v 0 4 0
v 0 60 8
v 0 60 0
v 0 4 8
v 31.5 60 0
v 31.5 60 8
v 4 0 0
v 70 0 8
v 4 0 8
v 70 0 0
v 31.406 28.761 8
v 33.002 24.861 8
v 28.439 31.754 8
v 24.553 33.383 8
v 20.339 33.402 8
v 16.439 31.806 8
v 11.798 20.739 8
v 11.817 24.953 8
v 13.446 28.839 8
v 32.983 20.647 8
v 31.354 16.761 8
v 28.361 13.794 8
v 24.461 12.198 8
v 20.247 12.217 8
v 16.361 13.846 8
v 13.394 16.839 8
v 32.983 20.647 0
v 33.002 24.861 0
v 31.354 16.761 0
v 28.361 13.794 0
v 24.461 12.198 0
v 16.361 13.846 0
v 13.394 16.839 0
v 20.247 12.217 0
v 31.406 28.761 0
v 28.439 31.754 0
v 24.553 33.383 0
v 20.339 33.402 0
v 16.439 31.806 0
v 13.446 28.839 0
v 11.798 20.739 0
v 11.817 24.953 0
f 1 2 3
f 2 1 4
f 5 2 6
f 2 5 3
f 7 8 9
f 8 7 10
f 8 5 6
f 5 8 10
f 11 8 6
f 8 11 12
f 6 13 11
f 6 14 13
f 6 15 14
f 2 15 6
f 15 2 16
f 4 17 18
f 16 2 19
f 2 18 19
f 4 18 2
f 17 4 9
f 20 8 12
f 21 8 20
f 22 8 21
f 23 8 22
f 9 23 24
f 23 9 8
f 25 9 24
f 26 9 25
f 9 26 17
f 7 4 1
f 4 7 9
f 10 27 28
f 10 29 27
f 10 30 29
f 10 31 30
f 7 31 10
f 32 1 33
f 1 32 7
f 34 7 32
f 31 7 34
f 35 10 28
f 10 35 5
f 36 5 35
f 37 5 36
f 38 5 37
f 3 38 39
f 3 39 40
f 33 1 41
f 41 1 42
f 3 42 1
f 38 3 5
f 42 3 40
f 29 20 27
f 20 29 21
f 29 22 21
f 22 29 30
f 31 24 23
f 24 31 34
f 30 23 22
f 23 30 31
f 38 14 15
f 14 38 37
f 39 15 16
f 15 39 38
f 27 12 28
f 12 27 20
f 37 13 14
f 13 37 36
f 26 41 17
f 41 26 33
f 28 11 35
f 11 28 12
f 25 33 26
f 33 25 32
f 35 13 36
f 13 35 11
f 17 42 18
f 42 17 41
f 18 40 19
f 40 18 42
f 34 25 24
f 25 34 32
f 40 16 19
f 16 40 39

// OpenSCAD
$fn = 32;

// ----------------------------------------------------------------------
// Bracket plate: gusset 70 x 60
// ----------------------------------------------------------------------

// --- parameters (mm) ---
hole_r = 3.5;             // bolt hole radius
plate_t = 8;              // plate thickness, Z (extrusion height)
gus_a = 70;               // base length
gus_b = 60;               // height
top_x = 31.5;             // top edge X of the angled cut
light_r = 10.8;           // lightening hole radius
fit_tol = 0.05;           // declared fit tolerance (prompt contract)
free_tol = 0.3;           // declared free tolerance (prompt contract)

light_d = 2 * light_r;

profile = [[4, 0], [35, 0], [70, 0], [31.5, 60], [0, 60], [0, 4]];  // primary outline, 6 points, counter clockwise
void_1 = [[33.002, 24.861], [31.406, 28.761], [28.439, 31.754], [24.553, 33.383], [20.339, 33.402], [16.439, 31.806], [13.446, 28.839], [11.817, 24.953], [11.798, 20.739], [13.394, 16.839], [16.361, 13.846], [20.247, 12.217], [24.461, 12.198], [28.361, 13.794], [31.354, 16.761], [32.983, 20.647]];  // lightening hole, 16 points

// --- the one profile operation ---
difference() {
  linear_extrude(height = plate_t) polygon(points = profile);
  translate([0, 0, -1])
    linear_extrude(height = plate_t + 2) polygon(points = void_1);
}
